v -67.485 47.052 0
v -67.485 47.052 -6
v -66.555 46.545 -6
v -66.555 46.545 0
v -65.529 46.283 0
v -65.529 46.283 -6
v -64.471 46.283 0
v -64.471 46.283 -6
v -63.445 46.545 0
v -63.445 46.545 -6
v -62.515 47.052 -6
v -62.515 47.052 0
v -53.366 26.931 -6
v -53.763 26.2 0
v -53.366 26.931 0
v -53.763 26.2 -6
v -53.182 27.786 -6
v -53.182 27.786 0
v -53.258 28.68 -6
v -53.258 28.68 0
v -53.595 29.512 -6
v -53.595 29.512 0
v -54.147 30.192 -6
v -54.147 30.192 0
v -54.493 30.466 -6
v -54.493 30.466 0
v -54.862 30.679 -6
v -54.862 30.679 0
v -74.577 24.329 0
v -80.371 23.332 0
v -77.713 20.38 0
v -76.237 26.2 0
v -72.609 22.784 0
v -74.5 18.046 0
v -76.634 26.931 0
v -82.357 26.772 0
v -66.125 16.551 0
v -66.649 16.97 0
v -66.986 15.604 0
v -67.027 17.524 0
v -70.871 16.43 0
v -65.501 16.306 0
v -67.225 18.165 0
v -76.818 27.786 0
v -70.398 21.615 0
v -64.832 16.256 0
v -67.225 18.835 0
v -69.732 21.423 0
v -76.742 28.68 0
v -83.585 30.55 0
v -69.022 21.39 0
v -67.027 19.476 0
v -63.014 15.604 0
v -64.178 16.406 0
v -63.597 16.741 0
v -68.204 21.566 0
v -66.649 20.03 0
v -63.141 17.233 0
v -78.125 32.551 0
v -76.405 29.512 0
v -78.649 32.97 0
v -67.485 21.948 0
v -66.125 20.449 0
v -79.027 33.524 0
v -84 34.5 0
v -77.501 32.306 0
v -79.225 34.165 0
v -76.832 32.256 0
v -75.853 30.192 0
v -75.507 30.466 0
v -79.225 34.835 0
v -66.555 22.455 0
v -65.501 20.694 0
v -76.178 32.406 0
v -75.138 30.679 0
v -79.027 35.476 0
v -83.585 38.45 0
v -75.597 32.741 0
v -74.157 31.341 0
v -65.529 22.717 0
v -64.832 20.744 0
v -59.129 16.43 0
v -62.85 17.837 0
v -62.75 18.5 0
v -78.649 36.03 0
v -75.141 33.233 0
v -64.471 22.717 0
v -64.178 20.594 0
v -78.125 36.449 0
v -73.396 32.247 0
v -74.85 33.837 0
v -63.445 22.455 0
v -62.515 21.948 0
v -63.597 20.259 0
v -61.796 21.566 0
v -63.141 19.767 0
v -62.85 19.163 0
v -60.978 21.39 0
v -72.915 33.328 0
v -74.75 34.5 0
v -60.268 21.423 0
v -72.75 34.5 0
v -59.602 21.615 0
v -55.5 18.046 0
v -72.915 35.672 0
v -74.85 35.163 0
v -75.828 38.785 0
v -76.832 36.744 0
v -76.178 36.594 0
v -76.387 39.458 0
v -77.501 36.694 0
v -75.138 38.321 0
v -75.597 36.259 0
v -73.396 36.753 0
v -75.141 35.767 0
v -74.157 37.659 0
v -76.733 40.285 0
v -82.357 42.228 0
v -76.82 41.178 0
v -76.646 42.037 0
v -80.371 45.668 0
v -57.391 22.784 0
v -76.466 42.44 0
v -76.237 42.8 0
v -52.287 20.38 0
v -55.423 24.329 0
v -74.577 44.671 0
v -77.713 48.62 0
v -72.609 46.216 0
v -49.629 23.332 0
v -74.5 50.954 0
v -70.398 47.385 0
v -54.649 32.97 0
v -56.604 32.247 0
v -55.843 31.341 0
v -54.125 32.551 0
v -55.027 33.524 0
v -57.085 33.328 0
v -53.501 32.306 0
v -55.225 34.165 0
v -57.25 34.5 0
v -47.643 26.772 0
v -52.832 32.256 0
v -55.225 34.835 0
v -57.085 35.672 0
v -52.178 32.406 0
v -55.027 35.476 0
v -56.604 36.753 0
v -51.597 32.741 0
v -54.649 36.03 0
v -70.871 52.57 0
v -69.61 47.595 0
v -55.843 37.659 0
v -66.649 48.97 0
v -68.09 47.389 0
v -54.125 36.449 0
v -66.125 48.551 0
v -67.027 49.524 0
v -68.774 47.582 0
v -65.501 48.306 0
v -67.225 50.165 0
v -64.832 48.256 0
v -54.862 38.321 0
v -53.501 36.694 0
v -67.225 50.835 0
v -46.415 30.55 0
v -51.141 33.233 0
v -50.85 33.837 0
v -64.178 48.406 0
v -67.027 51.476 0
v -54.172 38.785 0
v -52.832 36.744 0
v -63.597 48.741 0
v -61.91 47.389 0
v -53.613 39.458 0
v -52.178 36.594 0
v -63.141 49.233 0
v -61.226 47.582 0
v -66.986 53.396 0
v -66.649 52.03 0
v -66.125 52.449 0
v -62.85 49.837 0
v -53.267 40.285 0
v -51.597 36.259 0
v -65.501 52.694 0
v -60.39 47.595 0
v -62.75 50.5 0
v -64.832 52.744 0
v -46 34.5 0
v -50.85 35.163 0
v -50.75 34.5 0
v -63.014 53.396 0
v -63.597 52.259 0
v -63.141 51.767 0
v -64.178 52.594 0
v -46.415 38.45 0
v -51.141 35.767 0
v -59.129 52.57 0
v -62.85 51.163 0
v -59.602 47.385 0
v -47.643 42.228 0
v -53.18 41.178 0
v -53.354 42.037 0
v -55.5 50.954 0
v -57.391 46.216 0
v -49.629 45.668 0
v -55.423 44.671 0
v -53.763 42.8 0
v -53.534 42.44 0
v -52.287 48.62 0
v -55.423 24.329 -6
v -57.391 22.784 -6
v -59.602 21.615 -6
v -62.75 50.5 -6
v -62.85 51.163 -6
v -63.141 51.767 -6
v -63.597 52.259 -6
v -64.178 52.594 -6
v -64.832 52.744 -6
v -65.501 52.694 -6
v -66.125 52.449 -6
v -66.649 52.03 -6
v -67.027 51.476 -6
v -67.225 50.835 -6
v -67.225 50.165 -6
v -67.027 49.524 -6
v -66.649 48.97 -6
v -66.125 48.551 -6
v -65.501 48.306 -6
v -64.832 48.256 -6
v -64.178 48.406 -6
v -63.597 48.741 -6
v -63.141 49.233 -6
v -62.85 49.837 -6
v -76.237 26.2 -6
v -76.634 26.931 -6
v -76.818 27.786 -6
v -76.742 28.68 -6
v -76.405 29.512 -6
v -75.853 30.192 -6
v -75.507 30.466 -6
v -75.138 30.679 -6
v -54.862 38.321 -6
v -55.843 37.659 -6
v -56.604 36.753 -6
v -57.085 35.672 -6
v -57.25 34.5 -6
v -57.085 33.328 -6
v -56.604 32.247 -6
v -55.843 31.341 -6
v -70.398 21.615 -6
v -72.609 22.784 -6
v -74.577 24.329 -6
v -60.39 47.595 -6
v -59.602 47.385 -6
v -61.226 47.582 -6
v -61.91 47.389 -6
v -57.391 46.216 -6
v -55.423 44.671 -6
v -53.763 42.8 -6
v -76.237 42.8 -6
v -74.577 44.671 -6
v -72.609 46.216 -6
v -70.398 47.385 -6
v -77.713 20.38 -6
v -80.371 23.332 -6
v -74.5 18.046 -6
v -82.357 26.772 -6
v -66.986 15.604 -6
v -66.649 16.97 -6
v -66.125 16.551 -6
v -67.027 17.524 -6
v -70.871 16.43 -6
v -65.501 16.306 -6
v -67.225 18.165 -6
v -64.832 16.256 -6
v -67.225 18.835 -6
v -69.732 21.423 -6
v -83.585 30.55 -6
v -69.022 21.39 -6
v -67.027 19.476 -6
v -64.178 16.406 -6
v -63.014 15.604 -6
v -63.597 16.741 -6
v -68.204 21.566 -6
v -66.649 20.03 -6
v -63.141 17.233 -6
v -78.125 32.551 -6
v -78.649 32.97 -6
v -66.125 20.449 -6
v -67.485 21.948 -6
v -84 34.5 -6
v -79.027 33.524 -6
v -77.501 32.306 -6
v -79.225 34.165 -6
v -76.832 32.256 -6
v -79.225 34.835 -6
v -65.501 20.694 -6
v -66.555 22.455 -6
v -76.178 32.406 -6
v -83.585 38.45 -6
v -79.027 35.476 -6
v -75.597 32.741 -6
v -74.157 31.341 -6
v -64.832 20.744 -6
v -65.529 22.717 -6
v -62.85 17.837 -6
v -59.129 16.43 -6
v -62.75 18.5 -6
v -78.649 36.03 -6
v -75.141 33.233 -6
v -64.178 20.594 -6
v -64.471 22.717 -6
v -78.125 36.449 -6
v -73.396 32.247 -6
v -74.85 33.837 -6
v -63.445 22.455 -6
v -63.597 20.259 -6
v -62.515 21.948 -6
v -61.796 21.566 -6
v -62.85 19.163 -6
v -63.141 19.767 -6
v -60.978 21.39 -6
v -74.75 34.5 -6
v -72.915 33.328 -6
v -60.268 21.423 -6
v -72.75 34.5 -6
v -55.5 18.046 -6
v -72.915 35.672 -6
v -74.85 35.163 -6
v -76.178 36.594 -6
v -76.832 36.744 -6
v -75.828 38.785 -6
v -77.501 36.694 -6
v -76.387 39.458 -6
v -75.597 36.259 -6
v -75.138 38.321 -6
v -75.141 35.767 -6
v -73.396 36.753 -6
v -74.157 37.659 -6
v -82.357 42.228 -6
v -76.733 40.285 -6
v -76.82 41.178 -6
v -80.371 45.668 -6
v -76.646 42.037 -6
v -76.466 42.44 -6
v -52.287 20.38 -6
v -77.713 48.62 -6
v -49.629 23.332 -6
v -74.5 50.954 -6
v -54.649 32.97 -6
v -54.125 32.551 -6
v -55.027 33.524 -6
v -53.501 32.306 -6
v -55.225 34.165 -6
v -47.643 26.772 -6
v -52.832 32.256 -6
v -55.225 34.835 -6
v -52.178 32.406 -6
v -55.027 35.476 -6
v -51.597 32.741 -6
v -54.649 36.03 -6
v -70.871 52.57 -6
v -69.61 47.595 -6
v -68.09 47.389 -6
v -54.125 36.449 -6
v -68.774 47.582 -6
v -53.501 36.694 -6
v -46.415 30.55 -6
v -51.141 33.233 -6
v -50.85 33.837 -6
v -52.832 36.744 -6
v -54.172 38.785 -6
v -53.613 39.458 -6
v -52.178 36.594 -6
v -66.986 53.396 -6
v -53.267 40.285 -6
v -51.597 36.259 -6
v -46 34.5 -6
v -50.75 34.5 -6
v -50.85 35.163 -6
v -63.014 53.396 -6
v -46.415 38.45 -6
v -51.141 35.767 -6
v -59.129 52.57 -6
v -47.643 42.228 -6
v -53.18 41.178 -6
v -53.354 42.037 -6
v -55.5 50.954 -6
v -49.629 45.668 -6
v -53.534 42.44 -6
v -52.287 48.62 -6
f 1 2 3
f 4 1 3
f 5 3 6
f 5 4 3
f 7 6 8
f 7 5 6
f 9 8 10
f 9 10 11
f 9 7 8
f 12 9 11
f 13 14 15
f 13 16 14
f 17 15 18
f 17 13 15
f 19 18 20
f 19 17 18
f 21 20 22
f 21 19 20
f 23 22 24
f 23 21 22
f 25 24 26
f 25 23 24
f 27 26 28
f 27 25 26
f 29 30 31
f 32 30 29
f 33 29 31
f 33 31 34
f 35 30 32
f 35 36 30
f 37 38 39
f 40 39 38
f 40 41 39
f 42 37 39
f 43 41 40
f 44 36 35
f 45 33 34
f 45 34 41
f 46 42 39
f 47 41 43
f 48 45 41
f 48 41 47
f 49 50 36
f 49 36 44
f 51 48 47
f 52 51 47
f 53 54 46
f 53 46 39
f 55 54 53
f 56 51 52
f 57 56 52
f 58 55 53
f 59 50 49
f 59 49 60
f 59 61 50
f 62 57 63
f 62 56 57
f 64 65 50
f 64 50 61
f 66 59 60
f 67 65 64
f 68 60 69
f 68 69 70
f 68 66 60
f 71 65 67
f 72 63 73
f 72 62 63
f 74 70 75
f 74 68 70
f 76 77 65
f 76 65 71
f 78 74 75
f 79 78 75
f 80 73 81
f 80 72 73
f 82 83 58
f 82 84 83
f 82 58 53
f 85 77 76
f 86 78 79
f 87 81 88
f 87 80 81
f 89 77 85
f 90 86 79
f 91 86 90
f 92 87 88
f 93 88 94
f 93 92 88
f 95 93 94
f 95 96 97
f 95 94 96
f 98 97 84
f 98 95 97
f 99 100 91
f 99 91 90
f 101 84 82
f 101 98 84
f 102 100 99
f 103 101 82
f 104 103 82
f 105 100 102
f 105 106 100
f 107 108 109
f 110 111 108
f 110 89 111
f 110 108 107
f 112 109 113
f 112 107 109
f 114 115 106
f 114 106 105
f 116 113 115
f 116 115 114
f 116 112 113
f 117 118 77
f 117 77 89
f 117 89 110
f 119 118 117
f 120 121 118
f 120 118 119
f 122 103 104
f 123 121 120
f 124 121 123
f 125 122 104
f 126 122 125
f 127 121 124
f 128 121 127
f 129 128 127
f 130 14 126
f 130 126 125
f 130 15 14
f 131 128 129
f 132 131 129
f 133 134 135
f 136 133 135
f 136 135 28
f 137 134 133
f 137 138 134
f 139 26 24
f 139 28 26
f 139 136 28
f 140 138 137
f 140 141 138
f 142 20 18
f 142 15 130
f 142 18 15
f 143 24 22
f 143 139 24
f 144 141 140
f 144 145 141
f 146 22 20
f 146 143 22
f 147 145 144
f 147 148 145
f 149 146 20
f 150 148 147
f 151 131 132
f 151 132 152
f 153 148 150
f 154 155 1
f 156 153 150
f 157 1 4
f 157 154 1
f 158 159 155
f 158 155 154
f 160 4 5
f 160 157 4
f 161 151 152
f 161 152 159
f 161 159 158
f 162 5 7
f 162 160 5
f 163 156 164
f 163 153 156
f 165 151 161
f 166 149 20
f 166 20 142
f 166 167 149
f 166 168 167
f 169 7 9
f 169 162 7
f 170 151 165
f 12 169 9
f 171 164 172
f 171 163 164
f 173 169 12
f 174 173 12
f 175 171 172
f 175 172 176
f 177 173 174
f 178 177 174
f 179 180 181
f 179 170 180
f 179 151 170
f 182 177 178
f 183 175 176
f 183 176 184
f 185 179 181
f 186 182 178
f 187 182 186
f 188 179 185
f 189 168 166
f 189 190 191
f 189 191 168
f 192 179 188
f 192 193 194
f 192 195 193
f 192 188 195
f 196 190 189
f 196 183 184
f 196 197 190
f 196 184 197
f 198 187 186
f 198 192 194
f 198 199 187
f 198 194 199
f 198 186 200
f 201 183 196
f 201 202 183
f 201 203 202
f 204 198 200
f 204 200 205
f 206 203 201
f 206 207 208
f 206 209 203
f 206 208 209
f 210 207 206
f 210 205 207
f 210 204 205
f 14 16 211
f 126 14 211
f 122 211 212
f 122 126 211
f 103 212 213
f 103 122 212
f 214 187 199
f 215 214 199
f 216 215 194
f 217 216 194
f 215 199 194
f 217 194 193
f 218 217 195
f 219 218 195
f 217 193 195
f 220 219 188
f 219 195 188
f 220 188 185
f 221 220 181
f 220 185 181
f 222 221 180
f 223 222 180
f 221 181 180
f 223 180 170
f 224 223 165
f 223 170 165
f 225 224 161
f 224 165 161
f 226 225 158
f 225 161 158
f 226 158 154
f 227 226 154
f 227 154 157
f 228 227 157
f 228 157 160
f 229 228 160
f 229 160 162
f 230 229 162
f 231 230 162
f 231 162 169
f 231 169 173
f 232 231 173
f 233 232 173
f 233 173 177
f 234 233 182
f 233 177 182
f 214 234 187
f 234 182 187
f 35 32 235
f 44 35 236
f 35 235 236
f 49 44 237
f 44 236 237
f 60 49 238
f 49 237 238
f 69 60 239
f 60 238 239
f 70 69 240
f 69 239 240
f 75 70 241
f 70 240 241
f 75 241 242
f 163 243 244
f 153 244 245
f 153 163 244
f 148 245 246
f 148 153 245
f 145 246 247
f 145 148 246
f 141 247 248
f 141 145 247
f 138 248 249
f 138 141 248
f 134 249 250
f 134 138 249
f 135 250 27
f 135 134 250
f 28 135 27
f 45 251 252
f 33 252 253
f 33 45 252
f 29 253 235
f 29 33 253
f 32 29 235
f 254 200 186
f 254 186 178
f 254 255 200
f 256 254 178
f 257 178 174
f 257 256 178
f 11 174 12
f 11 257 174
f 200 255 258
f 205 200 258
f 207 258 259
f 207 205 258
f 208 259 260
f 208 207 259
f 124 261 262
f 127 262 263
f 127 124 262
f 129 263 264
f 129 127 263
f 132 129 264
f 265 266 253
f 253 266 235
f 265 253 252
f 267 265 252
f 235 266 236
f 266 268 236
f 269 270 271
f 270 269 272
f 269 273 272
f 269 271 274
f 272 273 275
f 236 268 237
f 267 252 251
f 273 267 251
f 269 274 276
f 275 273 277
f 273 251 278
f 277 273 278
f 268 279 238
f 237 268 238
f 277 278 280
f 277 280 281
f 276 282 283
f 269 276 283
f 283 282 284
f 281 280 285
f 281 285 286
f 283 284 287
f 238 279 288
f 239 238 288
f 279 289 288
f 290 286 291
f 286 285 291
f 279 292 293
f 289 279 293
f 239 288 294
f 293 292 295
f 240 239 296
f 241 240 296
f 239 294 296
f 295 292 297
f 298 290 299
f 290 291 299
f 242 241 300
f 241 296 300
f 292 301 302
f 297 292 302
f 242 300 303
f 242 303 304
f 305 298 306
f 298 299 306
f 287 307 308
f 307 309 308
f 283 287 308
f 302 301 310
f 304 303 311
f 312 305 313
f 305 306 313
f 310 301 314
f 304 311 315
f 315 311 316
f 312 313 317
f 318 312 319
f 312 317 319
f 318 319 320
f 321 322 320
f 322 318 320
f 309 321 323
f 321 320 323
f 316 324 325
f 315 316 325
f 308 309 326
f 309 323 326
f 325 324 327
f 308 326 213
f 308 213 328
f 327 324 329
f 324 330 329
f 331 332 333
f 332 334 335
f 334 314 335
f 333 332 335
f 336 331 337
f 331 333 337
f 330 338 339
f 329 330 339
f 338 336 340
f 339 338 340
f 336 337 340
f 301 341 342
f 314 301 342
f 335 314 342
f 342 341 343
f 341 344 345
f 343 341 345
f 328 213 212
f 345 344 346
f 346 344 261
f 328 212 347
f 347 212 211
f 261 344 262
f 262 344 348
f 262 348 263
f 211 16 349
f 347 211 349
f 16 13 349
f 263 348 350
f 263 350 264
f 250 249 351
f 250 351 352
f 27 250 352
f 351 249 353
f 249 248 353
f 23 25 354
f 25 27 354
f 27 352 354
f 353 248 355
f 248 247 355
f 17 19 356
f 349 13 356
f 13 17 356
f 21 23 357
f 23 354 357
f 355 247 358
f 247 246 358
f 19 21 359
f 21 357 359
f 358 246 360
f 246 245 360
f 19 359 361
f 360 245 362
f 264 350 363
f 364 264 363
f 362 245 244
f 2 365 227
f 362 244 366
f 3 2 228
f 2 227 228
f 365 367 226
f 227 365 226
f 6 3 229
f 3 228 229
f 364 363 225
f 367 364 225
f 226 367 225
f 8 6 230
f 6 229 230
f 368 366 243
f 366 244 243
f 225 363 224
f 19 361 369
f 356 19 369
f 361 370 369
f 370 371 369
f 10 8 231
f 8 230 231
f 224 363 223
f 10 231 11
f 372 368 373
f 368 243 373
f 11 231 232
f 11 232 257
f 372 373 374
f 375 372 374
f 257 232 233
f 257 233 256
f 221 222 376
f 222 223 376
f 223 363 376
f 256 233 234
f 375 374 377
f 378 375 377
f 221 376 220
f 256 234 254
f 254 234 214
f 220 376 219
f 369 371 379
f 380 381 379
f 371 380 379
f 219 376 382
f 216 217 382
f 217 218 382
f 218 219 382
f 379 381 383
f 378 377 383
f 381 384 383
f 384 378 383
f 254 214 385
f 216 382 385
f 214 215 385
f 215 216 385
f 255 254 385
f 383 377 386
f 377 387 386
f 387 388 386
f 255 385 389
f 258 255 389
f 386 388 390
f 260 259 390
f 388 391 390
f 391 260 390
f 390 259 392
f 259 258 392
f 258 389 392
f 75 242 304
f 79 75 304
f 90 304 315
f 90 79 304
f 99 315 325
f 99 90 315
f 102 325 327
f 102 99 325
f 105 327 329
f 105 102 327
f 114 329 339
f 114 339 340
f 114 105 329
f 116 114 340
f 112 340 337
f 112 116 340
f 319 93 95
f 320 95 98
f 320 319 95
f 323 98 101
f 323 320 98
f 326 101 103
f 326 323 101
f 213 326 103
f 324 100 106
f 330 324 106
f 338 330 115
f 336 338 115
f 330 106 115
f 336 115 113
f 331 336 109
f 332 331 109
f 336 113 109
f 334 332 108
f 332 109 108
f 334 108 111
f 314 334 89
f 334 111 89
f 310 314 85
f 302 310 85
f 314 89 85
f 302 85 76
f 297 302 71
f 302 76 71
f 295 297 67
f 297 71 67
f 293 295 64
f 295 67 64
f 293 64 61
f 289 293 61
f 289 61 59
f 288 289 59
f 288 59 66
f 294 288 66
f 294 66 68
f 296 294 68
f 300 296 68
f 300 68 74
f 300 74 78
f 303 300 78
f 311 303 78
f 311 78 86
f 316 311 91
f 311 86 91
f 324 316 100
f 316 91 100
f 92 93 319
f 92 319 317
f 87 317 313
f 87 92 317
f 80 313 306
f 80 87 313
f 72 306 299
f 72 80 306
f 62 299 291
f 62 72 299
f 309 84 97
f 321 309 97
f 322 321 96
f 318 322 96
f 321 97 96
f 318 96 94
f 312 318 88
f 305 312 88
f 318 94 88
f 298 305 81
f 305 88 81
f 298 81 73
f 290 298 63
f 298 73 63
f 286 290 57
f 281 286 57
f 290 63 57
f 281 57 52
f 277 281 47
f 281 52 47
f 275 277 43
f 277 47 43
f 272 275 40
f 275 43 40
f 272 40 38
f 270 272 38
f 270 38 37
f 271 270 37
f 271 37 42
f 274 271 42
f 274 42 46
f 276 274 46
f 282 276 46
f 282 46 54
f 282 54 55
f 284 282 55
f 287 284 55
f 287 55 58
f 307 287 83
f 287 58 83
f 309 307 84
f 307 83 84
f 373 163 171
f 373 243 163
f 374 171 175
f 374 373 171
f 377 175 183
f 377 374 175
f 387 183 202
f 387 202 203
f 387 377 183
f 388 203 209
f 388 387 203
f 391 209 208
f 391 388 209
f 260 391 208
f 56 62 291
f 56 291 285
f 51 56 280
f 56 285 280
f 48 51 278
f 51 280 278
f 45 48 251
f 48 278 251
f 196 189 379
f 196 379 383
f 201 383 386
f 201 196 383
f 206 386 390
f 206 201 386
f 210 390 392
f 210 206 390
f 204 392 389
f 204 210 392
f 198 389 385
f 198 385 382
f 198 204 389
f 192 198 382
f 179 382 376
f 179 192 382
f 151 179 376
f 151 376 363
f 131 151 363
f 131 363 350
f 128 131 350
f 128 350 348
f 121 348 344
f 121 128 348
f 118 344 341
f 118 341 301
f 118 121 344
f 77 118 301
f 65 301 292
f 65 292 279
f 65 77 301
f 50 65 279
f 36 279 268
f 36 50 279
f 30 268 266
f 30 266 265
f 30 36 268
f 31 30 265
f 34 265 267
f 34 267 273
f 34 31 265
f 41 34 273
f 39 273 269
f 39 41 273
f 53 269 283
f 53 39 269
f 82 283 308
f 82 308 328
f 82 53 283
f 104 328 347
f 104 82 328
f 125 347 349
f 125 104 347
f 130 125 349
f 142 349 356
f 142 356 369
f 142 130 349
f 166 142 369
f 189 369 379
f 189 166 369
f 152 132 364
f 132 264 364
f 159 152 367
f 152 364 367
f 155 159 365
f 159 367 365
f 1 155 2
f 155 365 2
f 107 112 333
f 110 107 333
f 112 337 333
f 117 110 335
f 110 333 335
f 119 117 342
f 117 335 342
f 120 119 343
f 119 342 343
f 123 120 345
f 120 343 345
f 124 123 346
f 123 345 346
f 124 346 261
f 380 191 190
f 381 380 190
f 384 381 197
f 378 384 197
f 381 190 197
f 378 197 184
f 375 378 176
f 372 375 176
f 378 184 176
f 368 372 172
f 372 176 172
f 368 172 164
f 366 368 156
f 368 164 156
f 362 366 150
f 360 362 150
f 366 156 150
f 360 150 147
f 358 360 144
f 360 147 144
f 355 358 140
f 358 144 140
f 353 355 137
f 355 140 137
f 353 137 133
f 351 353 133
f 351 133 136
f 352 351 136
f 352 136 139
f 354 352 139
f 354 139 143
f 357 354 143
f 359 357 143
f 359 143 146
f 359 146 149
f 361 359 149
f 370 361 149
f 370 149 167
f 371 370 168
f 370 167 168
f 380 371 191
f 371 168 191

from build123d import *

# Parameters (mm, degrees)
F0_R     = 19
F0_R_2   = 2.25
F1_DEPTH = 6
F2_R     = 3


with BuildPart() as f1:
    # F0 (on Top) → F1 (new body)
    with BuildSketch(Plane.XY):
        with Locations((-65, 34.5)):
            Circle(F0_R)
        with Locations((-65, 18.5)):
            Circle(F0_R_2, mode=Mode.SUBTRACT)
        with Locations((-77, 34.5)):
            Circle(F0_R_2, mode=Mode.SUBTRACT)
        with BuildLine():
            ThreePointArc((-68.461639, 20.965675), (-74.671252, 24.418939), (-78.3791, 30.479977))
            ThreePointArc((-78.3791, 30.479977), (-72.75, 34.5), (-78.3791, 38.520023))
            ThreePointArc((-78.3791, 38.520023), (-74.671252, 44.581061), (-68.461639, 48.034325))
            ThreePointArc((-68.461639, 48.034325), (-65, 46.25), (-61.538361, 48.034325))
            ThreePointArc((-61.538361, 48.034325), (-55.328748, 44.581061), (-51.6209, 38.520023))
            ThreePointArc((-51.6209, 38.520023), (-57.25, 34.5), (-51.6209, 30.479977))
            ThreePointArc((-51.6209, 30.479977), (-55.328748, 24.418939), (-61.538361, 20.965675))
            ThreePointArc((-61.538361, 20.965675), (-65, 22.75), (-68.461639, 20.965675))
        make_face(mode=Mode.SUBTRACT)
        with Locations((-53, 34.5)):
            Circle(F0_R_2, mode=Mode.SUBTRACT)
        with Locations((-65, 50.5)):
            Circle(F0_R_2, mode=Mode.SUBTRACT)
    extrude(amount=-F1_DEPTH)

    # F2
    f2_edges = [f1.edges().sort_by_distance(p)[0] for p in [
        (-61.538361, 20.965675, -3),
        (-68.461639, 20.965675, -3),
        (-78.3791, 30.479977, -3),
        (-78.3791, 38.520023, -3),
        (-51.6209, 30.479977, -3),
        (-68.461639, 48.034325, -3),
        (-61.538361, 48.034325, -3),
        (-51.6209, 38.520023, -3),
    ]]
    fillet(f2_edges, radius=F2_R)


solid = f1.part
